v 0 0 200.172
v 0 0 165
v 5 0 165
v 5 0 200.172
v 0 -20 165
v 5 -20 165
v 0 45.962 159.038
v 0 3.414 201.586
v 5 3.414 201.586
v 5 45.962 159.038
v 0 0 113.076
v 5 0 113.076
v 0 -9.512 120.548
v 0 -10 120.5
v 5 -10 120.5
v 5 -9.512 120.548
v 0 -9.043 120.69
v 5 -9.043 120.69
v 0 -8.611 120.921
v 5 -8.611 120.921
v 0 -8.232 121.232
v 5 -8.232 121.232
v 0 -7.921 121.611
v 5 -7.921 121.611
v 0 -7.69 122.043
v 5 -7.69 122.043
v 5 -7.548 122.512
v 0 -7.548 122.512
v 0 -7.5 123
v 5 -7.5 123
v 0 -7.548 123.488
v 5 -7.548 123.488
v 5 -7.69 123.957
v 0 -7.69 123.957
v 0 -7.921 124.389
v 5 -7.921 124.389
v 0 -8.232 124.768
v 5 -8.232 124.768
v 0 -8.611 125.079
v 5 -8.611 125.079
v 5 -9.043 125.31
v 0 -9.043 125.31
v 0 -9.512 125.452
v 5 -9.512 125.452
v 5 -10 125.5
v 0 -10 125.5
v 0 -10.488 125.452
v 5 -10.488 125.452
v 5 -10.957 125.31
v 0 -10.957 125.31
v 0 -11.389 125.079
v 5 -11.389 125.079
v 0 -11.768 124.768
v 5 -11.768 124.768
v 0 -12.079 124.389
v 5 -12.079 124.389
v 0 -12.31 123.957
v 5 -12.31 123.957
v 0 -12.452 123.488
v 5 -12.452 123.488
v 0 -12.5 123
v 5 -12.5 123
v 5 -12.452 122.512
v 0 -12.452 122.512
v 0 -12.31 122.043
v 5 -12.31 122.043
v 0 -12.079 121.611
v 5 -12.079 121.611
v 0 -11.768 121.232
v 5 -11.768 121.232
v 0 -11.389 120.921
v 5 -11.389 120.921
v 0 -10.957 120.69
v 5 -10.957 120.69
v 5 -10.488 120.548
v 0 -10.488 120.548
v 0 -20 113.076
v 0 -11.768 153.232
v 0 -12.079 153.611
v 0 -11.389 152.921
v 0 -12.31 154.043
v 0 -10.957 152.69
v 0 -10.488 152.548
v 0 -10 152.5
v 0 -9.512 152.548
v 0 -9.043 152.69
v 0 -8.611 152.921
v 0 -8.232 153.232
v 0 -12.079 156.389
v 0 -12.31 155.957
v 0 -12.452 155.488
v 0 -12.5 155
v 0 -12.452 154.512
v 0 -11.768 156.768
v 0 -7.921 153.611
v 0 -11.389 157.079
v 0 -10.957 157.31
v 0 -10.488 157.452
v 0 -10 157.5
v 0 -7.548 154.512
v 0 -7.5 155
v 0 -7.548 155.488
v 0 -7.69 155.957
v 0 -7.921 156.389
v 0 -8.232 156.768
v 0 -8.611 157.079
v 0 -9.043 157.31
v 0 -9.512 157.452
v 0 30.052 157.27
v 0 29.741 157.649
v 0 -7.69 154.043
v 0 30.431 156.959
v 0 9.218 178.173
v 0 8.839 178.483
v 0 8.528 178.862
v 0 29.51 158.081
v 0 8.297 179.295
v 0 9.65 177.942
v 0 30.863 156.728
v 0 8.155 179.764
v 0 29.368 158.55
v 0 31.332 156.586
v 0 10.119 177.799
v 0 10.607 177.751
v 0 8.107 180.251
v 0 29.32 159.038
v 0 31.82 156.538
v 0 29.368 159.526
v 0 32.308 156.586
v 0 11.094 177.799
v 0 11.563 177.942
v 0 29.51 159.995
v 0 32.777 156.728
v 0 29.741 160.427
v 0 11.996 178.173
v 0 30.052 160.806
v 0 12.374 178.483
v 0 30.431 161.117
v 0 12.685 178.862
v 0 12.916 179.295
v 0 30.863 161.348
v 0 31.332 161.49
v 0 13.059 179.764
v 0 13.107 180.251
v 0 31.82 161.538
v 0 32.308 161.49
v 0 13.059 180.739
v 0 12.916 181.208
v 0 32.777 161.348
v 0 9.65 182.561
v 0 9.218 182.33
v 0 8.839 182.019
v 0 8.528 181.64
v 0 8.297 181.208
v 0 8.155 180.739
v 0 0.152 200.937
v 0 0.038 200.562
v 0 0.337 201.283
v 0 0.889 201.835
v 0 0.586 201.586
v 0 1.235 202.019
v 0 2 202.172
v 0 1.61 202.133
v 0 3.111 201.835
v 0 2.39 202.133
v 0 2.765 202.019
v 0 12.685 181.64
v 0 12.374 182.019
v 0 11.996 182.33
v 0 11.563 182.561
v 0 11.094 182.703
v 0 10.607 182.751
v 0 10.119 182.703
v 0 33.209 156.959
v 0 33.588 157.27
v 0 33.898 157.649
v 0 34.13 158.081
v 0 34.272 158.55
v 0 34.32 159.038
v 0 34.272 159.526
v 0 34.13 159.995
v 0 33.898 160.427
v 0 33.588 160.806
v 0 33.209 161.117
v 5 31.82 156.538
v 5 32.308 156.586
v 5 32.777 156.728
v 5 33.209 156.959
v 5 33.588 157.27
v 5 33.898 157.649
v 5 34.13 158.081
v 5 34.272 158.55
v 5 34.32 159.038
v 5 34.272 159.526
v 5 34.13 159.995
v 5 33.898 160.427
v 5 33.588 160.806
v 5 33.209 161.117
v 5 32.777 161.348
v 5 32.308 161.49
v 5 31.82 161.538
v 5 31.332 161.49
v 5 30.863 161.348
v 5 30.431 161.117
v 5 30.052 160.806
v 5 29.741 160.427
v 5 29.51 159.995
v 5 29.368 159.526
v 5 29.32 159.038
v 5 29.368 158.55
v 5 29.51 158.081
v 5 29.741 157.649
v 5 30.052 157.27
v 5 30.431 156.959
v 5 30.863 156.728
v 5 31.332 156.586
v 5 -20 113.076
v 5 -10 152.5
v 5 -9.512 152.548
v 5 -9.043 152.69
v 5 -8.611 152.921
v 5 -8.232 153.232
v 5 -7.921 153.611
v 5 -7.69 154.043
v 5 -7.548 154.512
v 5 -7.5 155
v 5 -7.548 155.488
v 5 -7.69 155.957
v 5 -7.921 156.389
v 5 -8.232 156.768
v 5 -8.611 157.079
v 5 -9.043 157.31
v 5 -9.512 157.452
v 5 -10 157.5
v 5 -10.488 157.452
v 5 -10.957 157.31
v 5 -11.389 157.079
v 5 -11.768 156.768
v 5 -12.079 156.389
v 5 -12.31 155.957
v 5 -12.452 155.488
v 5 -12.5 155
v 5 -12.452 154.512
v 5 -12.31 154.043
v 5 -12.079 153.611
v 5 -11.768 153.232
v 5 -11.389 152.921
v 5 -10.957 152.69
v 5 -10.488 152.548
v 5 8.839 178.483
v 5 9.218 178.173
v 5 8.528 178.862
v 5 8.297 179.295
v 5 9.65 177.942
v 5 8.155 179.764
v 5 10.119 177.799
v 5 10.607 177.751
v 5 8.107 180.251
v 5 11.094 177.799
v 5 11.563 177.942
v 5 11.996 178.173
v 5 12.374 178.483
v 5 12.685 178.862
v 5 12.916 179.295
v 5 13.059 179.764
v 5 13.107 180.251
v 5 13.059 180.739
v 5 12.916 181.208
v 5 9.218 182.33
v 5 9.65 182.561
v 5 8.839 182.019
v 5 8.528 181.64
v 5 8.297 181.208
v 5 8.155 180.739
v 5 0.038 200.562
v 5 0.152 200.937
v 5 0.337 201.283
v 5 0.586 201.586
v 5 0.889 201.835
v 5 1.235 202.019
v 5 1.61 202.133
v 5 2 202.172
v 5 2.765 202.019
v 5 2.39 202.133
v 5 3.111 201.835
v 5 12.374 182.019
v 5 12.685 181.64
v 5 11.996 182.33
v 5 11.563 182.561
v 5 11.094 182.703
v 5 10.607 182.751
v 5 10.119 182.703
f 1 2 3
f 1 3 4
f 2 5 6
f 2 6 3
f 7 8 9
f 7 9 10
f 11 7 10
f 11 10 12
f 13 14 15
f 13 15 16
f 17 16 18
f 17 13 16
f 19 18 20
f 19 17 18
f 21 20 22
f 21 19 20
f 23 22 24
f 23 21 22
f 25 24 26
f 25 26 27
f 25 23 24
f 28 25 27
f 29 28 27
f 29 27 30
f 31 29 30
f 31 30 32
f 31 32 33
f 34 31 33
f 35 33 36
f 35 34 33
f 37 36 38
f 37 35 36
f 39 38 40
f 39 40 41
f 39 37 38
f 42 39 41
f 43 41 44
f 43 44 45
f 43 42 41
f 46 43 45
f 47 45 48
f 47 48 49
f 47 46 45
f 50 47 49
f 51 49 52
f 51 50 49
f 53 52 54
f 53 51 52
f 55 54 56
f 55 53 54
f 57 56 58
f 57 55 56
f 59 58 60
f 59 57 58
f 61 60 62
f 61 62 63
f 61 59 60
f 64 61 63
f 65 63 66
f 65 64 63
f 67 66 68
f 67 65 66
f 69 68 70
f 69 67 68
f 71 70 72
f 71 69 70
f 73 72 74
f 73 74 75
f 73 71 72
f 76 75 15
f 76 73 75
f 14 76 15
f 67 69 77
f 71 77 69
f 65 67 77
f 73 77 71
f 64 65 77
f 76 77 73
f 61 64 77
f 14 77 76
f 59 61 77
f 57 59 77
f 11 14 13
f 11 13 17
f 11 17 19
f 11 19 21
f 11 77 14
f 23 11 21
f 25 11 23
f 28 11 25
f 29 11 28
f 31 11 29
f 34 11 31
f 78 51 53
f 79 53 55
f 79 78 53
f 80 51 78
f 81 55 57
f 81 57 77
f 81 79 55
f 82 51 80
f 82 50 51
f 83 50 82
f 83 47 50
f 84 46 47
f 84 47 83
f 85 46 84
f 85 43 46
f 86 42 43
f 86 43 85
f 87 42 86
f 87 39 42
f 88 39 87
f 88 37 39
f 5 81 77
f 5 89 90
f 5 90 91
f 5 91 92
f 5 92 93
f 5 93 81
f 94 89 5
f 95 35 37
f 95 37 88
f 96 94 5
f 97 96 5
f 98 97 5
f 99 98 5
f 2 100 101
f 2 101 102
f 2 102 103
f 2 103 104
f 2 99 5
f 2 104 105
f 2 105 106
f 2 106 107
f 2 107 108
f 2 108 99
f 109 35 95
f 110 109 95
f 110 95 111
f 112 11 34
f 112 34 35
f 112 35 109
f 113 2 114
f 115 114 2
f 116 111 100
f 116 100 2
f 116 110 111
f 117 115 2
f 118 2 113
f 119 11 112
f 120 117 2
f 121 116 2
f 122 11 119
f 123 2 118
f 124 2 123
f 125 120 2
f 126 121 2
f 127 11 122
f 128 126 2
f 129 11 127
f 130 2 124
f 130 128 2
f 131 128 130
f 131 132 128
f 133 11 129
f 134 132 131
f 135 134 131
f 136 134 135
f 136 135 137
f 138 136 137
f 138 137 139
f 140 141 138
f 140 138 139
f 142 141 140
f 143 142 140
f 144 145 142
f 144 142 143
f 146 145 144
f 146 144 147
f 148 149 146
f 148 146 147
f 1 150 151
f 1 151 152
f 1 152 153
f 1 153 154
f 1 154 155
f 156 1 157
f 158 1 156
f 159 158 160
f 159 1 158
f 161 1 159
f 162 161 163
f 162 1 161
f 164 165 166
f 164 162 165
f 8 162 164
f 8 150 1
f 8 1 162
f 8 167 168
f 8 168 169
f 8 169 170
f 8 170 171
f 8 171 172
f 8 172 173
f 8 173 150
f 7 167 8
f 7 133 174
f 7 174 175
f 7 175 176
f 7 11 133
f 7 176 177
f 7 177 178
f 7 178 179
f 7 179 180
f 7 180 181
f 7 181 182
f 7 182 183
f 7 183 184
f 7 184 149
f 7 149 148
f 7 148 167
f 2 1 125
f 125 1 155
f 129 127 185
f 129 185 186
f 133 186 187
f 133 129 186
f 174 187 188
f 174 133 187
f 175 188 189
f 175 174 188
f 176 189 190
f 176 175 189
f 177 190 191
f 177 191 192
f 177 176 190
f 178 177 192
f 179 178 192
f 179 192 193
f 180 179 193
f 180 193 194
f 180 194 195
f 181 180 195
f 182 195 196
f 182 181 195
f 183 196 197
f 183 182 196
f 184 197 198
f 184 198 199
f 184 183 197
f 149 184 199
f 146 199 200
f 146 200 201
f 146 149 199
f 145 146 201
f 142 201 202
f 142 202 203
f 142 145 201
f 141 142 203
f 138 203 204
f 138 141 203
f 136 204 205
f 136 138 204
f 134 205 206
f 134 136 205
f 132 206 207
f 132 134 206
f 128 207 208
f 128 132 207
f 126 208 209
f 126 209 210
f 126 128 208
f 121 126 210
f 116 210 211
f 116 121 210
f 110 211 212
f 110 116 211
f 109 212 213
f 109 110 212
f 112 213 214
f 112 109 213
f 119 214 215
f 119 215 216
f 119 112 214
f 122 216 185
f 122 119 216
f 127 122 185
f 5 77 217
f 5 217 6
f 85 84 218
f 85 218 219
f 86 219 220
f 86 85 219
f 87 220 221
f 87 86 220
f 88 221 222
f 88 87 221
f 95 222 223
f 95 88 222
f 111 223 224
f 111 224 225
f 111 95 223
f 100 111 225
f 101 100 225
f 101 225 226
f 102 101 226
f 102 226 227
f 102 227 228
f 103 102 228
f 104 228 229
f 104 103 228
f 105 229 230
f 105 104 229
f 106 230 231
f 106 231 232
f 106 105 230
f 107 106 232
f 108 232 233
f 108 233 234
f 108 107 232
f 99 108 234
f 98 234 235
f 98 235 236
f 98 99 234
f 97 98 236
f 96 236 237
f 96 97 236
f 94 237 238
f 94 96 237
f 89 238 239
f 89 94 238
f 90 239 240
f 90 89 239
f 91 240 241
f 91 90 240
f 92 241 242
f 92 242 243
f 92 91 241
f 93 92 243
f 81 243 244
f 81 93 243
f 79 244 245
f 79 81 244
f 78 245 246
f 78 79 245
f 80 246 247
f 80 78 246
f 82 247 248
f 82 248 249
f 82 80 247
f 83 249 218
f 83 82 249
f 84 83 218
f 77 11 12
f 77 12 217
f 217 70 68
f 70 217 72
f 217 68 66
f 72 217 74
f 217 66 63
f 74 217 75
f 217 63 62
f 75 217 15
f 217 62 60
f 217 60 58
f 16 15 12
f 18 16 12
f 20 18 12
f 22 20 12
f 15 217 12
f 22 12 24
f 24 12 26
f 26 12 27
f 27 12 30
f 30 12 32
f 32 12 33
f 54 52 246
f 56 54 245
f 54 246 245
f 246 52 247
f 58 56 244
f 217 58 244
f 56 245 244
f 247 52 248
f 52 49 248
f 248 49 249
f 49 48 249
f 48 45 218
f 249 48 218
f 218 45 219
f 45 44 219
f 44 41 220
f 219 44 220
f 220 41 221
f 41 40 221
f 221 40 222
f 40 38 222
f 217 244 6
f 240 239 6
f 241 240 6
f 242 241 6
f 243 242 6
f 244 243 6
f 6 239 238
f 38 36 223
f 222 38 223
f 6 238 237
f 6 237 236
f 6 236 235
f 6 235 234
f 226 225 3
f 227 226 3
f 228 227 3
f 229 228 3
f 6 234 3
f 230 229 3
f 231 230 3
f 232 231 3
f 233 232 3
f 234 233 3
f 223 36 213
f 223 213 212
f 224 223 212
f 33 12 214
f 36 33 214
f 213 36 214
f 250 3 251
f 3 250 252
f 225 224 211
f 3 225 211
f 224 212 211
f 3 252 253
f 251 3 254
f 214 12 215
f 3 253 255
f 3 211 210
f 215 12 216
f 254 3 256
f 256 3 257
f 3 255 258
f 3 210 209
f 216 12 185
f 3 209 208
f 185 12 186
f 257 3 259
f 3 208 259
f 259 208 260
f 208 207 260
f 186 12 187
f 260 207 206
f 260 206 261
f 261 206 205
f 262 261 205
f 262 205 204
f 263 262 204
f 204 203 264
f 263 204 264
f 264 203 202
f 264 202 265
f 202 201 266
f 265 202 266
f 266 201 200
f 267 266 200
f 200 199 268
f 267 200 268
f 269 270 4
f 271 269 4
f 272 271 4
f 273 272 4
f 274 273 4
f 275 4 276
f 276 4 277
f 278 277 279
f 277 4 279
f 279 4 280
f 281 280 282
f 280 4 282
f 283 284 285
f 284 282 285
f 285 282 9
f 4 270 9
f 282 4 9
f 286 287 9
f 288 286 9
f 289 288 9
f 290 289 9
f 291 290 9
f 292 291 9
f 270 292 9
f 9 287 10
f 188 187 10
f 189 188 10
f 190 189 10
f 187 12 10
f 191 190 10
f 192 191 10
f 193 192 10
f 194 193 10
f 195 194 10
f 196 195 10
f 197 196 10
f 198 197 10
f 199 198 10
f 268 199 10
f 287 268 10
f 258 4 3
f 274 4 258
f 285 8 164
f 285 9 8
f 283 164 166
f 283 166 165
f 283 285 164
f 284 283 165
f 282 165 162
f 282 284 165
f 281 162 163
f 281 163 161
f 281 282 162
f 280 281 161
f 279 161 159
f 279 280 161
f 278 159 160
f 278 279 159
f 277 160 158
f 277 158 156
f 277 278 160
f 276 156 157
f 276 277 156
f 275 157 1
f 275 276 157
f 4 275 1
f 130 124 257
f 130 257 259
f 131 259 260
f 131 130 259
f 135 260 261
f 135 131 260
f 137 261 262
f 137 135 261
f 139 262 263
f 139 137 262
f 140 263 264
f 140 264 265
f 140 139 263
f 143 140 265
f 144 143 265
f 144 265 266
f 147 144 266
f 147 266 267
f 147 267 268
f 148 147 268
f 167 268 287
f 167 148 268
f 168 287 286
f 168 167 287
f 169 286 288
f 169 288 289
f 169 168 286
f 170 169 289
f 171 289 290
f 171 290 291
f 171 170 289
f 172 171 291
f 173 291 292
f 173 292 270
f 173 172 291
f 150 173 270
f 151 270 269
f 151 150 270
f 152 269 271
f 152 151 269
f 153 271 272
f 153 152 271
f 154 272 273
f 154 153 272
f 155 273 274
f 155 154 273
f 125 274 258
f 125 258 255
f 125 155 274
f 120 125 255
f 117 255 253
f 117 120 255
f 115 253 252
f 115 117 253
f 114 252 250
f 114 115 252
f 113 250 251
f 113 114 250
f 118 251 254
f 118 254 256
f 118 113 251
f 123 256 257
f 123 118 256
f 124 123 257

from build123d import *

# Parameters (mm, degrees)
SKETCH_1_R      = 2.5
EXTRUDE_1_DEPTH = 5
FILLET_1_R      = 2


with BuildPart() as part:
    # 草图1 → 凸台-拉伸1 (new body)
    with BuildSketch(Plane(origin=(0, 0, 0), x_dir=(0, 0, -1), z_dir=(1, 0, 0))):
        Polygon((-159.038059223, 45.961940777), (-113.076118446, 0), (-113.076118446, -20), (-165, -20), (-165, 0), (-205, 0), align=None)
        with Locations((-155, -10)):
            Circle(SKETCH_1_R, mode=Mode.SUBTRACT)
        with Locations((-123, -10)):
            Circle(SKETCH_1_R, mode=Mode.SUBTRACT)
        with Locations((-180.251262658, 10.606601718)):
            Circle(SKETCH_1_R, mode=Mode.SUBTRACT)
        with Locations((-159.038059223, 31.819805153)):
            Circle(SKETCH_1_R, mode=Mode.SUBTRACT)
    extrude(amount=EXTRUDE_1_DEPTH)

    # 圆角1
    fillet_1_edges = [part.edges().sort_by_distance(p)[0] for p in [
        (2.5, 0, 205),
    ]]
    fillet(fillet_1_edges, radius=FILLET_1_R)


solid = part.part
